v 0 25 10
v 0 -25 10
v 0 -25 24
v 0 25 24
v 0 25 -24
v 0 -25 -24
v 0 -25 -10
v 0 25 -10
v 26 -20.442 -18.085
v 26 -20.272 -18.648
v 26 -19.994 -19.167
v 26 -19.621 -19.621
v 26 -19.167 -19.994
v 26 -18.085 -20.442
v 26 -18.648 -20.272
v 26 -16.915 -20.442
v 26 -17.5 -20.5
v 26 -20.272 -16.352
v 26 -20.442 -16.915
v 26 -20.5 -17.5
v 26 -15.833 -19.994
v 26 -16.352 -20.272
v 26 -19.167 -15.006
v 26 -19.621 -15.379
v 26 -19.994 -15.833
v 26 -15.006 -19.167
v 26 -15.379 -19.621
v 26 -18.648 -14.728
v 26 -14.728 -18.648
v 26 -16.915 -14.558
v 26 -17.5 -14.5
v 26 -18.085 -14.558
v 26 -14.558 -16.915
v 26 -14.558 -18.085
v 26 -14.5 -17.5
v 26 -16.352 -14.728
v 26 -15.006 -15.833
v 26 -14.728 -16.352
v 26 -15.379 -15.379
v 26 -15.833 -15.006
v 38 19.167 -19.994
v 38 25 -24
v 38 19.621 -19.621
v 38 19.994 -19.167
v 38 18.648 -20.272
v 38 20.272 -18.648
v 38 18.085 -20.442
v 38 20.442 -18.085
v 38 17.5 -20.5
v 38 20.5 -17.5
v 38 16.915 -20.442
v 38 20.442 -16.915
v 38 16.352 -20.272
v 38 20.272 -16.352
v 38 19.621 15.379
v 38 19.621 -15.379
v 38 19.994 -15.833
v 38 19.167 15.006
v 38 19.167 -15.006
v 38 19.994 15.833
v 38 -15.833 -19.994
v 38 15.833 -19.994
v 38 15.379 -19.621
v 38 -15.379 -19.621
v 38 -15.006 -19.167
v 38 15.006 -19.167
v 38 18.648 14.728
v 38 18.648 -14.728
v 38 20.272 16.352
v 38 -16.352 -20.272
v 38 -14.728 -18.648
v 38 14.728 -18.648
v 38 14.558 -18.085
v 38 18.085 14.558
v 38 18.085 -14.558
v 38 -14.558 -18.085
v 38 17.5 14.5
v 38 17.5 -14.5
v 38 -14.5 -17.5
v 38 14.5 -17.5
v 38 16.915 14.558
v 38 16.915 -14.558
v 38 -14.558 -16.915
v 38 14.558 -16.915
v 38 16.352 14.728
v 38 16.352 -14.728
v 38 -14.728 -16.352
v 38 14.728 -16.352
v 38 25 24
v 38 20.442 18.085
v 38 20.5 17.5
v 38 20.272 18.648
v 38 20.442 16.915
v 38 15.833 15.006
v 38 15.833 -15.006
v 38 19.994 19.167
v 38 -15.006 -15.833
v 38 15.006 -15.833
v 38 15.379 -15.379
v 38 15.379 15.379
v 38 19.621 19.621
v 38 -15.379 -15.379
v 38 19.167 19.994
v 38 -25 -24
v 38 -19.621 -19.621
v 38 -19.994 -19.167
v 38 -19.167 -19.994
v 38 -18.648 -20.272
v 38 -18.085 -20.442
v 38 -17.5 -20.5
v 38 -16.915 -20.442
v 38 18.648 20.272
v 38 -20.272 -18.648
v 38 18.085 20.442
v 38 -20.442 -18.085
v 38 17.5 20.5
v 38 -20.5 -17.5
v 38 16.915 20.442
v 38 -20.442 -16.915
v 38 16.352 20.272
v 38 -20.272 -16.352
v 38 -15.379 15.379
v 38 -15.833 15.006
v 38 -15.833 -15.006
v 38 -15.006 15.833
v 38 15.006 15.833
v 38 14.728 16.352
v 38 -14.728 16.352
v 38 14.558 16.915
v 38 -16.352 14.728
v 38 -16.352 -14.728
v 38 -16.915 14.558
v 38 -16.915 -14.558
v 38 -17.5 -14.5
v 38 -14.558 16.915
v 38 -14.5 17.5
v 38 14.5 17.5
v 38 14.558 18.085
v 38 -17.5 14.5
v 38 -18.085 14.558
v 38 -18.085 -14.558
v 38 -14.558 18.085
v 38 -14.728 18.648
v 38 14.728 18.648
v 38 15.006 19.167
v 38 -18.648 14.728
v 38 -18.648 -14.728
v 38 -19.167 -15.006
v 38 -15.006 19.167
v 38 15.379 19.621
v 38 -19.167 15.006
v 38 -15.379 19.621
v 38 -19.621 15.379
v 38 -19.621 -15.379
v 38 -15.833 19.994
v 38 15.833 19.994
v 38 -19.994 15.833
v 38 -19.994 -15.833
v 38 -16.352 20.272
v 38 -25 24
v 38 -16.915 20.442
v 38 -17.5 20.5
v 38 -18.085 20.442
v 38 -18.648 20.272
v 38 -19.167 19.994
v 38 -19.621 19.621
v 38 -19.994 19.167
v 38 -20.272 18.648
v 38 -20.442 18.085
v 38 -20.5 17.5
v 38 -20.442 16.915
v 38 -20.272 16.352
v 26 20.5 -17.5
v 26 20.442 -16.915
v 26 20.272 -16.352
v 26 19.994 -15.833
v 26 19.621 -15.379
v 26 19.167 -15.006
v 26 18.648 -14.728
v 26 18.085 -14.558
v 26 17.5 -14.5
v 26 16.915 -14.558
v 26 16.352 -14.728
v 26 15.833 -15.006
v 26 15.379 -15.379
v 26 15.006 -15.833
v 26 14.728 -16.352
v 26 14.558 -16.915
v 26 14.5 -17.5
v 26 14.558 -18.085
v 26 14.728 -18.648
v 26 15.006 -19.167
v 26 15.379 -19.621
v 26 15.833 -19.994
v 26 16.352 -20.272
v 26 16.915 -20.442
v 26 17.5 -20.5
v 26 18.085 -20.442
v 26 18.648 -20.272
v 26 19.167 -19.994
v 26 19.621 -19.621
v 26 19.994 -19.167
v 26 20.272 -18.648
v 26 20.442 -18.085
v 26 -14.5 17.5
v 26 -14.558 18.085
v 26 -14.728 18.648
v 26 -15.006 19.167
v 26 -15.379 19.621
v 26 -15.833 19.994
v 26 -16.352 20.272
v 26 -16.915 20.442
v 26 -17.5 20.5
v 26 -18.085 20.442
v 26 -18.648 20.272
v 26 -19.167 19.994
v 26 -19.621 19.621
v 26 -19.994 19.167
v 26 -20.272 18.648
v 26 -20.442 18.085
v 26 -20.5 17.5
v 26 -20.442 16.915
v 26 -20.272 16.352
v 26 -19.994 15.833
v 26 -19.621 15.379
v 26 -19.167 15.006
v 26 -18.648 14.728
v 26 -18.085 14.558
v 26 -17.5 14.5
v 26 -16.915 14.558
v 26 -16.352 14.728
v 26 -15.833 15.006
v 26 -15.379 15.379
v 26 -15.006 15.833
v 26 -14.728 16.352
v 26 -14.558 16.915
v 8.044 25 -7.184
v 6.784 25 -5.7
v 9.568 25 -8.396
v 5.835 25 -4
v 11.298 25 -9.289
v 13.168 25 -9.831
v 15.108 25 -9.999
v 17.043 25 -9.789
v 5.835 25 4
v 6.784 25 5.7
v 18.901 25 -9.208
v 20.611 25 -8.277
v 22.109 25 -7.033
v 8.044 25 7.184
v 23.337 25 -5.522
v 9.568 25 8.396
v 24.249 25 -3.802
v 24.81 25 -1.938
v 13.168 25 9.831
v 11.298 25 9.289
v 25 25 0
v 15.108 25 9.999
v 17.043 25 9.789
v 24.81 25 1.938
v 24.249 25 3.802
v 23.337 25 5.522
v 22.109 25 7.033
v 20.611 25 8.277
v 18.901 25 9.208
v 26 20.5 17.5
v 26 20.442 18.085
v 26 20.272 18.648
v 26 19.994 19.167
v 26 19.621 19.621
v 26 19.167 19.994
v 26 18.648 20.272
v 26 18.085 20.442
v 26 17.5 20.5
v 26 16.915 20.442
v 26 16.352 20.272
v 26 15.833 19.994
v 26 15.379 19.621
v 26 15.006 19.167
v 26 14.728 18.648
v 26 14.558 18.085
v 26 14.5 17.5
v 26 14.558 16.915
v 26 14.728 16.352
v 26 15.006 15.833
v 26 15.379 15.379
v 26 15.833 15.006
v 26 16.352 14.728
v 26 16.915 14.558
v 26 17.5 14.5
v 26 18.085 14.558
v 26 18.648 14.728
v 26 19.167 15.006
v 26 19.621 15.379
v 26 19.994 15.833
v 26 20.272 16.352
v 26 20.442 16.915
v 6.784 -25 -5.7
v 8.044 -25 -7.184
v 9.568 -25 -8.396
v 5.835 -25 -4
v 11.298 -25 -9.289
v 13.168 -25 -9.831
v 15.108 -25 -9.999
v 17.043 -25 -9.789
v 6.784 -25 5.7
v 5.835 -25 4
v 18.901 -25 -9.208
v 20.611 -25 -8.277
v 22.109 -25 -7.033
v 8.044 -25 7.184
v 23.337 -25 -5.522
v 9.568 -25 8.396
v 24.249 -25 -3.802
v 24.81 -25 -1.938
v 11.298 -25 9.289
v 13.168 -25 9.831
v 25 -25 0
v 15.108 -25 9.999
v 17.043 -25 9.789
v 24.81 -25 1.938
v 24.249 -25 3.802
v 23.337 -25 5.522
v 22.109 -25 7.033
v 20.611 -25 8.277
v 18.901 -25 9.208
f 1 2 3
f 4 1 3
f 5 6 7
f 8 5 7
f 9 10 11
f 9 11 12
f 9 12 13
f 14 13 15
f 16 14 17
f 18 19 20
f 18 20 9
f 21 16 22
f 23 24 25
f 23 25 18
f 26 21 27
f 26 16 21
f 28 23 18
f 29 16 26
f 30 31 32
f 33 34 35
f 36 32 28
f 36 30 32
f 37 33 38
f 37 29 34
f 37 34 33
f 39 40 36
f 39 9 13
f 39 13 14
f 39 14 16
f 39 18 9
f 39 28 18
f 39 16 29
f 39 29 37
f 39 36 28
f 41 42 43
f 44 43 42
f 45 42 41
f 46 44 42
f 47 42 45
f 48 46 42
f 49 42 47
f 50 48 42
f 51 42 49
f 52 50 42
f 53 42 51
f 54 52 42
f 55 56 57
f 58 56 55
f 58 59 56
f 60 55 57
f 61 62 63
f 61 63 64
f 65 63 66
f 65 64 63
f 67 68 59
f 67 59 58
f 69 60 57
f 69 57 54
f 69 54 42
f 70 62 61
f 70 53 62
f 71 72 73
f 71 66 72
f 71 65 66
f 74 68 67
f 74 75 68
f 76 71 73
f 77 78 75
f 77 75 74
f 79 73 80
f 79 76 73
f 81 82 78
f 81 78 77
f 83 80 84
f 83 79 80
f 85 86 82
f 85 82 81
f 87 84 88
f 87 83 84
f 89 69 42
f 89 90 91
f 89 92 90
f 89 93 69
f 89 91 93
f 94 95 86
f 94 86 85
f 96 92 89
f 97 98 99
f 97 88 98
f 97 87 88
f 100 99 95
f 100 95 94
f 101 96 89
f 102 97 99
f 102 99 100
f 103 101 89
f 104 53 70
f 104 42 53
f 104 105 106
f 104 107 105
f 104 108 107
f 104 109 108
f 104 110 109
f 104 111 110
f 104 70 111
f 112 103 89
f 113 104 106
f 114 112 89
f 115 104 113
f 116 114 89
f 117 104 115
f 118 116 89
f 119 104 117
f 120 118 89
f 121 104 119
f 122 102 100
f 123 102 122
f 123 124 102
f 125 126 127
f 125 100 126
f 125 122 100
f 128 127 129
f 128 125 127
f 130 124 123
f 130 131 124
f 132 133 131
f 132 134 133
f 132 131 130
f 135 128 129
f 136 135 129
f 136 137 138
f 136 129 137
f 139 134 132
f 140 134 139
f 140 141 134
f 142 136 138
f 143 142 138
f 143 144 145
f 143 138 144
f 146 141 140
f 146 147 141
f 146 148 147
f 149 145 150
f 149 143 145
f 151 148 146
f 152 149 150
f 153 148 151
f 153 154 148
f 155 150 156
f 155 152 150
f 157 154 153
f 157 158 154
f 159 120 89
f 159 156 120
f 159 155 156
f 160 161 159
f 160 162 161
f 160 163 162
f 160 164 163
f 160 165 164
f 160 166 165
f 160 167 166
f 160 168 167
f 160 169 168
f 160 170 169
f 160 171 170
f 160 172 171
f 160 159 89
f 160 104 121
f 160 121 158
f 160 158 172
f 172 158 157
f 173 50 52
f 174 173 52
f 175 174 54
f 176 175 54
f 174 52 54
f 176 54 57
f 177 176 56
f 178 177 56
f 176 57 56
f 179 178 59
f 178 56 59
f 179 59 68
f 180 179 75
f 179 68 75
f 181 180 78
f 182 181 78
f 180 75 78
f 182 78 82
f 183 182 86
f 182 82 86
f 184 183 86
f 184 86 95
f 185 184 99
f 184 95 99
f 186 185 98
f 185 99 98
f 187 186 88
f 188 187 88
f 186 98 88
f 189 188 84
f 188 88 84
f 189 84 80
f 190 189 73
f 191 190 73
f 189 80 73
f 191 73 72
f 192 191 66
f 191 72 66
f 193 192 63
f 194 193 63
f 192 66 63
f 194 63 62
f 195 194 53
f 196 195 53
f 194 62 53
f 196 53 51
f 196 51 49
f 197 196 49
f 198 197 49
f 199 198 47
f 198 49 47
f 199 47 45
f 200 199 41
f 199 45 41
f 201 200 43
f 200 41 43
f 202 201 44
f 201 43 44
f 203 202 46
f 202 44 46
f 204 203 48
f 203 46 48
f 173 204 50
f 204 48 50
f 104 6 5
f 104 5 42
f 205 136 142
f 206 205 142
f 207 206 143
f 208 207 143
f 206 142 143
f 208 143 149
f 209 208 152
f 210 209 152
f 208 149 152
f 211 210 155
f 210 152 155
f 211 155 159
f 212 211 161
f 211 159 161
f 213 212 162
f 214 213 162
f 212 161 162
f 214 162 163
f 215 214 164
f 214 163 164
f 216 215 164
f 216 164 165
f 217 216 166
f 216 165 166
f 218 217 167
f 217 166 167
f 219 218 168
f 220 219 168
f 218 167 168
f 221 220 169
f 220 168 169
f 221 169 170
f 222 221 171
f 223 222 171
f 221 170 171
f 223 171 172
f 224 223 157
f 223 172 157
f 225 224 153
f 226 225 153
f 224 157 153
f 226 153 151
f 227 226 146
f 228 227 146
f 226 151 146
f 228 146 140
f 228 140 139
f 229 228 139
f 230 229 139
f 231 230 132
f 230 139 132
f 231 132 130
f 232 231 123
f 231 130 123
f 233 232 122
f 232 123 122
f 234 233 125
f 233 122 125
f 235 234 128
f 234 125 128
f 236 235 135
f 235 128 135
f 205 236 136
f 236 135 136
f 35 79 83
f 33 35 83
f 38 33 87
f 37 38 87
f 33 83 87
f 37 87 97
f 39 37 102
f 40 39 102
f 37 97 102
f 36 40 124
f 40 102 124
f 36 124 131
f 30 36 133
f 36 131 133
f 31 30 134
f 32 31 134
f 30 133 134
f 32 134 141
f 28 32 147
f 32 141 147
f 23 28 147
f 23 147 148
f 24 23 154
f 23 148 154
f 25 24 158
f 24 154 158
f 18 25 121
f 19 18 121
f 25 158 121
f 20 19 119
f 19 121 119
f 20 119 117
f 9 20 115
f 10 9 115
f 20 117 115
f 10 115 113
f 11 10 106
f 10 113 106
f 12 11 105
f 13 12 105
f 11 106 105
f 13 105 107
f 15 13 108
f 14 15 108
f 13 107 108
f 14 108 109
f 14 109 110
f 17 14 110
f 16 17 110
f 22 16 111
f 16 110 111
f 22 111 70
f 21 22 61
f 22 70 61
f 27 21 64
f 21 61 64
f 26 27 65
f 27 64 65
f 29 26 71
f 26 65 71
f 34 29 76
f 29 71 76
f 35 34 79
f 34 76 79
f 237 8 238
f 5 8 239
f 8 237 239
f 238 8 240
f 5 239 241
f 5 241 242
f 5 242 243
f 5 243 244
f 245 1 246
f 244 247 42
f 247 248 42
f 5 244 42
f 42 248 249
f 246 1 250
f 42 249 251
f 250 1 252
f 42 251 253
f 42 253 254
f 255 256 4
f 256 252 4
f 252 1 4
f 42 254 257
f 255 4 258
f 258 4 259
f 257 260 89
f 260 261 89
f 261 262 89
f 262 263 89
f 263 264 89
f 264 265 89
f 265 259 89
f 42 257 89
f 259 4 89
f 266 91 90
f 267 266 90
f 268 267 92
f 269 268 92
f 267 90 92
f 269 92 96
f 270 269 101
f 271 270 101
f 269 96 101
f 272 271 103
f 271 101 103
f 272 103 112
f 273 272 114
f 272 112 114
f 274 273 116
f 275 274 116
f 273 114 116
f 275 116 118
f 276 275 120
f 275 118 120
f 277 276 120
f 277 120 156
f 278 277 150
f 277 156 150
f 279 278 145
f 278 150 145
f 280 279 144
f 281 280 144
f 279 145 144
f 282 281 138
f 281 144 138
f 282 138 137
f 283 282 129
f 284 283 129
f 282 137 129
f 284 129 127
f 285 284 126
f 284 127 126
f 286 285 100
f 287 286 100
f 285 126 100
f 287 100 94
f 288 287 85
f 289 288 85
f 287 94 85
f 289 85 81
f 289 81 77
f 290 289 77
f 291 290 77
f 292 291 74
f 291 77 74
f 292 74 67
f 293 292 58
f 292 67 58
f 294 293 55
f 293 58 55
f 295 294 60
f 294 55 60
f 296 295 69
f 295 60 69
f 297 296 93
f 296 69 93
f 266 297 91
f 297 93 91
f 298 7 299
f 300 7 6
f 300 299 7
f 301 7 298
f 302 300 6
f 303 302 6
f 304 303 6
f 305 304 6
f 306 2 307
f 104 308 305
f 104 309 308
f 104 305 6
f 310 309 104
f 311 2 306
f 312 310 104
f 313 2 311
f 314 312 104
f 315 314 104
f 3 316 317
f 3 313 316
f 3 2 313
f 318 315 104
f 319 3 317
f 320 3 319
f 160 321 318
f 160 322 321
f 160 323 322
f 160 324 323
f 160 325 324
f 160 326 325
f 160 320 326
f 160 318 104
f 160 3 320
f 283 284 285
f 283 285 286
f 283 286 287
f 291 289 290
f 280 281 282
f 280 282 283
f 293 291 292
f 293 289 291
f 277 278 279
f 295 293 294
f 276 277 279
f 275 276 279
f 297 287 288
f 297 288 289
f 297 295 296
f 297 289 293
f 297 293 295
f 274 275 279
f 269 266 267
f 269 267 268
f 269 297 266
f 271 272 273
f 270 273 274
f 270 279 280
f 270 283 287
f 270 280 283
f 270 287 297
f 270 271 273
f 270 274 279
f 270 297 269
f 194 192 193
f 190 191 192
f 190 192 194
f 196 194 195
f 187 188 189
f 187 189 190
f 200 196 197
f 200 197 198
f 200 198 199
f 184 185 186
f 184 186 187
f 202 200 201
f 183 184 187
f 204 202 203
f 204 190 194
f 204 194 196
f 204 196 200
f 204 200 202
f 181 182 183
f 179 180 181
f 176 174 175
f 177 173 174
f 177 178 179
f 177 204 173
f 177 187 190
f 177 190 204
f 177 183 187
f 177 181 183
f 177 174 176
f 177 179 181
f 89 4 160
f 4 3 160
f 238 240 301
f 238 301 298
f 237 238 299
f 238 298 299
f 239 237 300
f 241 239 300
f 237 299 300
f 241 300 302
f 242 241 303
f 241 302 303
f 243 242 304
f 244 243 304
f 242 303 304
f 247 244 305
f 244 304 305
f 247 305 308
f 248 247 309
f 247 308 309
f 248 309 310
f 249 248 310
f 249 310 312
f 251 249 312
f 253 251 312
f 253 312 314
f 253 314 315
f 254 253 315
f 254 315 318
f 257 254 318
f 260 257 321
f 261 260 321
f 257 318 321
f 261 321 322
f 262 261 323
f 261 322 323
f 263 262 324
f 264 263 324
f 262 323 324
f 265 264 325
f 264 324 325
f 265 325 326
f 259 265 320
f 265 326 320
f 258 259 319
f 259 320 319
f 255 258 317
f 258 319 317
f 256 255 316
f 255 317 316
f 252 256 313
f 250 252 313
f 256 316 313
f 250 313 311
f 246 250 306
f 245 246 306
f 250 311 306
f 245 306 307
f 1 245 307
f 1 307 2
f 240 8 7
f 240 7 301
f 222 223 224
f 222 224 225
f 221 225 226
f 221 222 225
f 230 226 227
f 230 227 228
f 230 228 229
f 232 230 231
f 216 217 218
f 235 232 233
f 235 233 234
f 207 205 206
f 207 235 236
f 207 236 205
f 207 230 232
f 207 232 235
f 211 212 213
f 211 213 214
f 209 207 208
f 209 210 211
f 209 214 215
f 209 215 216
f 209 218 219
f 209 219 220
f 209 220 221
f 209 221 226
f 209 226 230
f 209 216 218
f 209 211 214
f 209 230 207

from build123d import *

# Parameters (mm, degrees)
F0_W     = 38
F0_H     = 48
F1_DEPTH = 25
F3_DEPTH = 50
F4_R     = 3
F5_DEPTH = 12


with BuildPart() as f1:
    # F0 (on Front) → F1 (new body, symmetric)
    with BuildSketch(Plane.XZ):
        with Locations((19, 0)):
            Rectangle(F0_W, F0_H)
    extrude(amount=F1_DEPTH, both=True)

    # F2 (on face) → F3 (cut)
    with BuildSketch(Plane.XZ.offset(25)):
        with BuildLine():
            Line((0, -10), (5.834849, -4))
            ThreePointArc((5.834849, -4), (25, 0), (5.834849, 4))
            Line((5.834849, 4), (0, 10))
            Line((0, 10), (0, -10))
        make_face()
    extrude(amount=-F3_DEPTH, mode=Mode.SUBTRACT)

    # F4 (on face) → F5 (cut)
    with BuildSketch(Plane.YZ.offset(38)):
        with Locations((-17.5, 17.5)):
            Circle(F4_R)
        with Locations((17.5, 17.5)):
            Circle(F4_R)
        with Locations((17.5, -17.5)):
            Circle(F4_R)
        with Locations((-17.5, -17.5)):
            Circle(F4_R)
    extrude(amount=-F5_DEPTH, mode=Mode.SUBTRACT)


solid = f1.part
